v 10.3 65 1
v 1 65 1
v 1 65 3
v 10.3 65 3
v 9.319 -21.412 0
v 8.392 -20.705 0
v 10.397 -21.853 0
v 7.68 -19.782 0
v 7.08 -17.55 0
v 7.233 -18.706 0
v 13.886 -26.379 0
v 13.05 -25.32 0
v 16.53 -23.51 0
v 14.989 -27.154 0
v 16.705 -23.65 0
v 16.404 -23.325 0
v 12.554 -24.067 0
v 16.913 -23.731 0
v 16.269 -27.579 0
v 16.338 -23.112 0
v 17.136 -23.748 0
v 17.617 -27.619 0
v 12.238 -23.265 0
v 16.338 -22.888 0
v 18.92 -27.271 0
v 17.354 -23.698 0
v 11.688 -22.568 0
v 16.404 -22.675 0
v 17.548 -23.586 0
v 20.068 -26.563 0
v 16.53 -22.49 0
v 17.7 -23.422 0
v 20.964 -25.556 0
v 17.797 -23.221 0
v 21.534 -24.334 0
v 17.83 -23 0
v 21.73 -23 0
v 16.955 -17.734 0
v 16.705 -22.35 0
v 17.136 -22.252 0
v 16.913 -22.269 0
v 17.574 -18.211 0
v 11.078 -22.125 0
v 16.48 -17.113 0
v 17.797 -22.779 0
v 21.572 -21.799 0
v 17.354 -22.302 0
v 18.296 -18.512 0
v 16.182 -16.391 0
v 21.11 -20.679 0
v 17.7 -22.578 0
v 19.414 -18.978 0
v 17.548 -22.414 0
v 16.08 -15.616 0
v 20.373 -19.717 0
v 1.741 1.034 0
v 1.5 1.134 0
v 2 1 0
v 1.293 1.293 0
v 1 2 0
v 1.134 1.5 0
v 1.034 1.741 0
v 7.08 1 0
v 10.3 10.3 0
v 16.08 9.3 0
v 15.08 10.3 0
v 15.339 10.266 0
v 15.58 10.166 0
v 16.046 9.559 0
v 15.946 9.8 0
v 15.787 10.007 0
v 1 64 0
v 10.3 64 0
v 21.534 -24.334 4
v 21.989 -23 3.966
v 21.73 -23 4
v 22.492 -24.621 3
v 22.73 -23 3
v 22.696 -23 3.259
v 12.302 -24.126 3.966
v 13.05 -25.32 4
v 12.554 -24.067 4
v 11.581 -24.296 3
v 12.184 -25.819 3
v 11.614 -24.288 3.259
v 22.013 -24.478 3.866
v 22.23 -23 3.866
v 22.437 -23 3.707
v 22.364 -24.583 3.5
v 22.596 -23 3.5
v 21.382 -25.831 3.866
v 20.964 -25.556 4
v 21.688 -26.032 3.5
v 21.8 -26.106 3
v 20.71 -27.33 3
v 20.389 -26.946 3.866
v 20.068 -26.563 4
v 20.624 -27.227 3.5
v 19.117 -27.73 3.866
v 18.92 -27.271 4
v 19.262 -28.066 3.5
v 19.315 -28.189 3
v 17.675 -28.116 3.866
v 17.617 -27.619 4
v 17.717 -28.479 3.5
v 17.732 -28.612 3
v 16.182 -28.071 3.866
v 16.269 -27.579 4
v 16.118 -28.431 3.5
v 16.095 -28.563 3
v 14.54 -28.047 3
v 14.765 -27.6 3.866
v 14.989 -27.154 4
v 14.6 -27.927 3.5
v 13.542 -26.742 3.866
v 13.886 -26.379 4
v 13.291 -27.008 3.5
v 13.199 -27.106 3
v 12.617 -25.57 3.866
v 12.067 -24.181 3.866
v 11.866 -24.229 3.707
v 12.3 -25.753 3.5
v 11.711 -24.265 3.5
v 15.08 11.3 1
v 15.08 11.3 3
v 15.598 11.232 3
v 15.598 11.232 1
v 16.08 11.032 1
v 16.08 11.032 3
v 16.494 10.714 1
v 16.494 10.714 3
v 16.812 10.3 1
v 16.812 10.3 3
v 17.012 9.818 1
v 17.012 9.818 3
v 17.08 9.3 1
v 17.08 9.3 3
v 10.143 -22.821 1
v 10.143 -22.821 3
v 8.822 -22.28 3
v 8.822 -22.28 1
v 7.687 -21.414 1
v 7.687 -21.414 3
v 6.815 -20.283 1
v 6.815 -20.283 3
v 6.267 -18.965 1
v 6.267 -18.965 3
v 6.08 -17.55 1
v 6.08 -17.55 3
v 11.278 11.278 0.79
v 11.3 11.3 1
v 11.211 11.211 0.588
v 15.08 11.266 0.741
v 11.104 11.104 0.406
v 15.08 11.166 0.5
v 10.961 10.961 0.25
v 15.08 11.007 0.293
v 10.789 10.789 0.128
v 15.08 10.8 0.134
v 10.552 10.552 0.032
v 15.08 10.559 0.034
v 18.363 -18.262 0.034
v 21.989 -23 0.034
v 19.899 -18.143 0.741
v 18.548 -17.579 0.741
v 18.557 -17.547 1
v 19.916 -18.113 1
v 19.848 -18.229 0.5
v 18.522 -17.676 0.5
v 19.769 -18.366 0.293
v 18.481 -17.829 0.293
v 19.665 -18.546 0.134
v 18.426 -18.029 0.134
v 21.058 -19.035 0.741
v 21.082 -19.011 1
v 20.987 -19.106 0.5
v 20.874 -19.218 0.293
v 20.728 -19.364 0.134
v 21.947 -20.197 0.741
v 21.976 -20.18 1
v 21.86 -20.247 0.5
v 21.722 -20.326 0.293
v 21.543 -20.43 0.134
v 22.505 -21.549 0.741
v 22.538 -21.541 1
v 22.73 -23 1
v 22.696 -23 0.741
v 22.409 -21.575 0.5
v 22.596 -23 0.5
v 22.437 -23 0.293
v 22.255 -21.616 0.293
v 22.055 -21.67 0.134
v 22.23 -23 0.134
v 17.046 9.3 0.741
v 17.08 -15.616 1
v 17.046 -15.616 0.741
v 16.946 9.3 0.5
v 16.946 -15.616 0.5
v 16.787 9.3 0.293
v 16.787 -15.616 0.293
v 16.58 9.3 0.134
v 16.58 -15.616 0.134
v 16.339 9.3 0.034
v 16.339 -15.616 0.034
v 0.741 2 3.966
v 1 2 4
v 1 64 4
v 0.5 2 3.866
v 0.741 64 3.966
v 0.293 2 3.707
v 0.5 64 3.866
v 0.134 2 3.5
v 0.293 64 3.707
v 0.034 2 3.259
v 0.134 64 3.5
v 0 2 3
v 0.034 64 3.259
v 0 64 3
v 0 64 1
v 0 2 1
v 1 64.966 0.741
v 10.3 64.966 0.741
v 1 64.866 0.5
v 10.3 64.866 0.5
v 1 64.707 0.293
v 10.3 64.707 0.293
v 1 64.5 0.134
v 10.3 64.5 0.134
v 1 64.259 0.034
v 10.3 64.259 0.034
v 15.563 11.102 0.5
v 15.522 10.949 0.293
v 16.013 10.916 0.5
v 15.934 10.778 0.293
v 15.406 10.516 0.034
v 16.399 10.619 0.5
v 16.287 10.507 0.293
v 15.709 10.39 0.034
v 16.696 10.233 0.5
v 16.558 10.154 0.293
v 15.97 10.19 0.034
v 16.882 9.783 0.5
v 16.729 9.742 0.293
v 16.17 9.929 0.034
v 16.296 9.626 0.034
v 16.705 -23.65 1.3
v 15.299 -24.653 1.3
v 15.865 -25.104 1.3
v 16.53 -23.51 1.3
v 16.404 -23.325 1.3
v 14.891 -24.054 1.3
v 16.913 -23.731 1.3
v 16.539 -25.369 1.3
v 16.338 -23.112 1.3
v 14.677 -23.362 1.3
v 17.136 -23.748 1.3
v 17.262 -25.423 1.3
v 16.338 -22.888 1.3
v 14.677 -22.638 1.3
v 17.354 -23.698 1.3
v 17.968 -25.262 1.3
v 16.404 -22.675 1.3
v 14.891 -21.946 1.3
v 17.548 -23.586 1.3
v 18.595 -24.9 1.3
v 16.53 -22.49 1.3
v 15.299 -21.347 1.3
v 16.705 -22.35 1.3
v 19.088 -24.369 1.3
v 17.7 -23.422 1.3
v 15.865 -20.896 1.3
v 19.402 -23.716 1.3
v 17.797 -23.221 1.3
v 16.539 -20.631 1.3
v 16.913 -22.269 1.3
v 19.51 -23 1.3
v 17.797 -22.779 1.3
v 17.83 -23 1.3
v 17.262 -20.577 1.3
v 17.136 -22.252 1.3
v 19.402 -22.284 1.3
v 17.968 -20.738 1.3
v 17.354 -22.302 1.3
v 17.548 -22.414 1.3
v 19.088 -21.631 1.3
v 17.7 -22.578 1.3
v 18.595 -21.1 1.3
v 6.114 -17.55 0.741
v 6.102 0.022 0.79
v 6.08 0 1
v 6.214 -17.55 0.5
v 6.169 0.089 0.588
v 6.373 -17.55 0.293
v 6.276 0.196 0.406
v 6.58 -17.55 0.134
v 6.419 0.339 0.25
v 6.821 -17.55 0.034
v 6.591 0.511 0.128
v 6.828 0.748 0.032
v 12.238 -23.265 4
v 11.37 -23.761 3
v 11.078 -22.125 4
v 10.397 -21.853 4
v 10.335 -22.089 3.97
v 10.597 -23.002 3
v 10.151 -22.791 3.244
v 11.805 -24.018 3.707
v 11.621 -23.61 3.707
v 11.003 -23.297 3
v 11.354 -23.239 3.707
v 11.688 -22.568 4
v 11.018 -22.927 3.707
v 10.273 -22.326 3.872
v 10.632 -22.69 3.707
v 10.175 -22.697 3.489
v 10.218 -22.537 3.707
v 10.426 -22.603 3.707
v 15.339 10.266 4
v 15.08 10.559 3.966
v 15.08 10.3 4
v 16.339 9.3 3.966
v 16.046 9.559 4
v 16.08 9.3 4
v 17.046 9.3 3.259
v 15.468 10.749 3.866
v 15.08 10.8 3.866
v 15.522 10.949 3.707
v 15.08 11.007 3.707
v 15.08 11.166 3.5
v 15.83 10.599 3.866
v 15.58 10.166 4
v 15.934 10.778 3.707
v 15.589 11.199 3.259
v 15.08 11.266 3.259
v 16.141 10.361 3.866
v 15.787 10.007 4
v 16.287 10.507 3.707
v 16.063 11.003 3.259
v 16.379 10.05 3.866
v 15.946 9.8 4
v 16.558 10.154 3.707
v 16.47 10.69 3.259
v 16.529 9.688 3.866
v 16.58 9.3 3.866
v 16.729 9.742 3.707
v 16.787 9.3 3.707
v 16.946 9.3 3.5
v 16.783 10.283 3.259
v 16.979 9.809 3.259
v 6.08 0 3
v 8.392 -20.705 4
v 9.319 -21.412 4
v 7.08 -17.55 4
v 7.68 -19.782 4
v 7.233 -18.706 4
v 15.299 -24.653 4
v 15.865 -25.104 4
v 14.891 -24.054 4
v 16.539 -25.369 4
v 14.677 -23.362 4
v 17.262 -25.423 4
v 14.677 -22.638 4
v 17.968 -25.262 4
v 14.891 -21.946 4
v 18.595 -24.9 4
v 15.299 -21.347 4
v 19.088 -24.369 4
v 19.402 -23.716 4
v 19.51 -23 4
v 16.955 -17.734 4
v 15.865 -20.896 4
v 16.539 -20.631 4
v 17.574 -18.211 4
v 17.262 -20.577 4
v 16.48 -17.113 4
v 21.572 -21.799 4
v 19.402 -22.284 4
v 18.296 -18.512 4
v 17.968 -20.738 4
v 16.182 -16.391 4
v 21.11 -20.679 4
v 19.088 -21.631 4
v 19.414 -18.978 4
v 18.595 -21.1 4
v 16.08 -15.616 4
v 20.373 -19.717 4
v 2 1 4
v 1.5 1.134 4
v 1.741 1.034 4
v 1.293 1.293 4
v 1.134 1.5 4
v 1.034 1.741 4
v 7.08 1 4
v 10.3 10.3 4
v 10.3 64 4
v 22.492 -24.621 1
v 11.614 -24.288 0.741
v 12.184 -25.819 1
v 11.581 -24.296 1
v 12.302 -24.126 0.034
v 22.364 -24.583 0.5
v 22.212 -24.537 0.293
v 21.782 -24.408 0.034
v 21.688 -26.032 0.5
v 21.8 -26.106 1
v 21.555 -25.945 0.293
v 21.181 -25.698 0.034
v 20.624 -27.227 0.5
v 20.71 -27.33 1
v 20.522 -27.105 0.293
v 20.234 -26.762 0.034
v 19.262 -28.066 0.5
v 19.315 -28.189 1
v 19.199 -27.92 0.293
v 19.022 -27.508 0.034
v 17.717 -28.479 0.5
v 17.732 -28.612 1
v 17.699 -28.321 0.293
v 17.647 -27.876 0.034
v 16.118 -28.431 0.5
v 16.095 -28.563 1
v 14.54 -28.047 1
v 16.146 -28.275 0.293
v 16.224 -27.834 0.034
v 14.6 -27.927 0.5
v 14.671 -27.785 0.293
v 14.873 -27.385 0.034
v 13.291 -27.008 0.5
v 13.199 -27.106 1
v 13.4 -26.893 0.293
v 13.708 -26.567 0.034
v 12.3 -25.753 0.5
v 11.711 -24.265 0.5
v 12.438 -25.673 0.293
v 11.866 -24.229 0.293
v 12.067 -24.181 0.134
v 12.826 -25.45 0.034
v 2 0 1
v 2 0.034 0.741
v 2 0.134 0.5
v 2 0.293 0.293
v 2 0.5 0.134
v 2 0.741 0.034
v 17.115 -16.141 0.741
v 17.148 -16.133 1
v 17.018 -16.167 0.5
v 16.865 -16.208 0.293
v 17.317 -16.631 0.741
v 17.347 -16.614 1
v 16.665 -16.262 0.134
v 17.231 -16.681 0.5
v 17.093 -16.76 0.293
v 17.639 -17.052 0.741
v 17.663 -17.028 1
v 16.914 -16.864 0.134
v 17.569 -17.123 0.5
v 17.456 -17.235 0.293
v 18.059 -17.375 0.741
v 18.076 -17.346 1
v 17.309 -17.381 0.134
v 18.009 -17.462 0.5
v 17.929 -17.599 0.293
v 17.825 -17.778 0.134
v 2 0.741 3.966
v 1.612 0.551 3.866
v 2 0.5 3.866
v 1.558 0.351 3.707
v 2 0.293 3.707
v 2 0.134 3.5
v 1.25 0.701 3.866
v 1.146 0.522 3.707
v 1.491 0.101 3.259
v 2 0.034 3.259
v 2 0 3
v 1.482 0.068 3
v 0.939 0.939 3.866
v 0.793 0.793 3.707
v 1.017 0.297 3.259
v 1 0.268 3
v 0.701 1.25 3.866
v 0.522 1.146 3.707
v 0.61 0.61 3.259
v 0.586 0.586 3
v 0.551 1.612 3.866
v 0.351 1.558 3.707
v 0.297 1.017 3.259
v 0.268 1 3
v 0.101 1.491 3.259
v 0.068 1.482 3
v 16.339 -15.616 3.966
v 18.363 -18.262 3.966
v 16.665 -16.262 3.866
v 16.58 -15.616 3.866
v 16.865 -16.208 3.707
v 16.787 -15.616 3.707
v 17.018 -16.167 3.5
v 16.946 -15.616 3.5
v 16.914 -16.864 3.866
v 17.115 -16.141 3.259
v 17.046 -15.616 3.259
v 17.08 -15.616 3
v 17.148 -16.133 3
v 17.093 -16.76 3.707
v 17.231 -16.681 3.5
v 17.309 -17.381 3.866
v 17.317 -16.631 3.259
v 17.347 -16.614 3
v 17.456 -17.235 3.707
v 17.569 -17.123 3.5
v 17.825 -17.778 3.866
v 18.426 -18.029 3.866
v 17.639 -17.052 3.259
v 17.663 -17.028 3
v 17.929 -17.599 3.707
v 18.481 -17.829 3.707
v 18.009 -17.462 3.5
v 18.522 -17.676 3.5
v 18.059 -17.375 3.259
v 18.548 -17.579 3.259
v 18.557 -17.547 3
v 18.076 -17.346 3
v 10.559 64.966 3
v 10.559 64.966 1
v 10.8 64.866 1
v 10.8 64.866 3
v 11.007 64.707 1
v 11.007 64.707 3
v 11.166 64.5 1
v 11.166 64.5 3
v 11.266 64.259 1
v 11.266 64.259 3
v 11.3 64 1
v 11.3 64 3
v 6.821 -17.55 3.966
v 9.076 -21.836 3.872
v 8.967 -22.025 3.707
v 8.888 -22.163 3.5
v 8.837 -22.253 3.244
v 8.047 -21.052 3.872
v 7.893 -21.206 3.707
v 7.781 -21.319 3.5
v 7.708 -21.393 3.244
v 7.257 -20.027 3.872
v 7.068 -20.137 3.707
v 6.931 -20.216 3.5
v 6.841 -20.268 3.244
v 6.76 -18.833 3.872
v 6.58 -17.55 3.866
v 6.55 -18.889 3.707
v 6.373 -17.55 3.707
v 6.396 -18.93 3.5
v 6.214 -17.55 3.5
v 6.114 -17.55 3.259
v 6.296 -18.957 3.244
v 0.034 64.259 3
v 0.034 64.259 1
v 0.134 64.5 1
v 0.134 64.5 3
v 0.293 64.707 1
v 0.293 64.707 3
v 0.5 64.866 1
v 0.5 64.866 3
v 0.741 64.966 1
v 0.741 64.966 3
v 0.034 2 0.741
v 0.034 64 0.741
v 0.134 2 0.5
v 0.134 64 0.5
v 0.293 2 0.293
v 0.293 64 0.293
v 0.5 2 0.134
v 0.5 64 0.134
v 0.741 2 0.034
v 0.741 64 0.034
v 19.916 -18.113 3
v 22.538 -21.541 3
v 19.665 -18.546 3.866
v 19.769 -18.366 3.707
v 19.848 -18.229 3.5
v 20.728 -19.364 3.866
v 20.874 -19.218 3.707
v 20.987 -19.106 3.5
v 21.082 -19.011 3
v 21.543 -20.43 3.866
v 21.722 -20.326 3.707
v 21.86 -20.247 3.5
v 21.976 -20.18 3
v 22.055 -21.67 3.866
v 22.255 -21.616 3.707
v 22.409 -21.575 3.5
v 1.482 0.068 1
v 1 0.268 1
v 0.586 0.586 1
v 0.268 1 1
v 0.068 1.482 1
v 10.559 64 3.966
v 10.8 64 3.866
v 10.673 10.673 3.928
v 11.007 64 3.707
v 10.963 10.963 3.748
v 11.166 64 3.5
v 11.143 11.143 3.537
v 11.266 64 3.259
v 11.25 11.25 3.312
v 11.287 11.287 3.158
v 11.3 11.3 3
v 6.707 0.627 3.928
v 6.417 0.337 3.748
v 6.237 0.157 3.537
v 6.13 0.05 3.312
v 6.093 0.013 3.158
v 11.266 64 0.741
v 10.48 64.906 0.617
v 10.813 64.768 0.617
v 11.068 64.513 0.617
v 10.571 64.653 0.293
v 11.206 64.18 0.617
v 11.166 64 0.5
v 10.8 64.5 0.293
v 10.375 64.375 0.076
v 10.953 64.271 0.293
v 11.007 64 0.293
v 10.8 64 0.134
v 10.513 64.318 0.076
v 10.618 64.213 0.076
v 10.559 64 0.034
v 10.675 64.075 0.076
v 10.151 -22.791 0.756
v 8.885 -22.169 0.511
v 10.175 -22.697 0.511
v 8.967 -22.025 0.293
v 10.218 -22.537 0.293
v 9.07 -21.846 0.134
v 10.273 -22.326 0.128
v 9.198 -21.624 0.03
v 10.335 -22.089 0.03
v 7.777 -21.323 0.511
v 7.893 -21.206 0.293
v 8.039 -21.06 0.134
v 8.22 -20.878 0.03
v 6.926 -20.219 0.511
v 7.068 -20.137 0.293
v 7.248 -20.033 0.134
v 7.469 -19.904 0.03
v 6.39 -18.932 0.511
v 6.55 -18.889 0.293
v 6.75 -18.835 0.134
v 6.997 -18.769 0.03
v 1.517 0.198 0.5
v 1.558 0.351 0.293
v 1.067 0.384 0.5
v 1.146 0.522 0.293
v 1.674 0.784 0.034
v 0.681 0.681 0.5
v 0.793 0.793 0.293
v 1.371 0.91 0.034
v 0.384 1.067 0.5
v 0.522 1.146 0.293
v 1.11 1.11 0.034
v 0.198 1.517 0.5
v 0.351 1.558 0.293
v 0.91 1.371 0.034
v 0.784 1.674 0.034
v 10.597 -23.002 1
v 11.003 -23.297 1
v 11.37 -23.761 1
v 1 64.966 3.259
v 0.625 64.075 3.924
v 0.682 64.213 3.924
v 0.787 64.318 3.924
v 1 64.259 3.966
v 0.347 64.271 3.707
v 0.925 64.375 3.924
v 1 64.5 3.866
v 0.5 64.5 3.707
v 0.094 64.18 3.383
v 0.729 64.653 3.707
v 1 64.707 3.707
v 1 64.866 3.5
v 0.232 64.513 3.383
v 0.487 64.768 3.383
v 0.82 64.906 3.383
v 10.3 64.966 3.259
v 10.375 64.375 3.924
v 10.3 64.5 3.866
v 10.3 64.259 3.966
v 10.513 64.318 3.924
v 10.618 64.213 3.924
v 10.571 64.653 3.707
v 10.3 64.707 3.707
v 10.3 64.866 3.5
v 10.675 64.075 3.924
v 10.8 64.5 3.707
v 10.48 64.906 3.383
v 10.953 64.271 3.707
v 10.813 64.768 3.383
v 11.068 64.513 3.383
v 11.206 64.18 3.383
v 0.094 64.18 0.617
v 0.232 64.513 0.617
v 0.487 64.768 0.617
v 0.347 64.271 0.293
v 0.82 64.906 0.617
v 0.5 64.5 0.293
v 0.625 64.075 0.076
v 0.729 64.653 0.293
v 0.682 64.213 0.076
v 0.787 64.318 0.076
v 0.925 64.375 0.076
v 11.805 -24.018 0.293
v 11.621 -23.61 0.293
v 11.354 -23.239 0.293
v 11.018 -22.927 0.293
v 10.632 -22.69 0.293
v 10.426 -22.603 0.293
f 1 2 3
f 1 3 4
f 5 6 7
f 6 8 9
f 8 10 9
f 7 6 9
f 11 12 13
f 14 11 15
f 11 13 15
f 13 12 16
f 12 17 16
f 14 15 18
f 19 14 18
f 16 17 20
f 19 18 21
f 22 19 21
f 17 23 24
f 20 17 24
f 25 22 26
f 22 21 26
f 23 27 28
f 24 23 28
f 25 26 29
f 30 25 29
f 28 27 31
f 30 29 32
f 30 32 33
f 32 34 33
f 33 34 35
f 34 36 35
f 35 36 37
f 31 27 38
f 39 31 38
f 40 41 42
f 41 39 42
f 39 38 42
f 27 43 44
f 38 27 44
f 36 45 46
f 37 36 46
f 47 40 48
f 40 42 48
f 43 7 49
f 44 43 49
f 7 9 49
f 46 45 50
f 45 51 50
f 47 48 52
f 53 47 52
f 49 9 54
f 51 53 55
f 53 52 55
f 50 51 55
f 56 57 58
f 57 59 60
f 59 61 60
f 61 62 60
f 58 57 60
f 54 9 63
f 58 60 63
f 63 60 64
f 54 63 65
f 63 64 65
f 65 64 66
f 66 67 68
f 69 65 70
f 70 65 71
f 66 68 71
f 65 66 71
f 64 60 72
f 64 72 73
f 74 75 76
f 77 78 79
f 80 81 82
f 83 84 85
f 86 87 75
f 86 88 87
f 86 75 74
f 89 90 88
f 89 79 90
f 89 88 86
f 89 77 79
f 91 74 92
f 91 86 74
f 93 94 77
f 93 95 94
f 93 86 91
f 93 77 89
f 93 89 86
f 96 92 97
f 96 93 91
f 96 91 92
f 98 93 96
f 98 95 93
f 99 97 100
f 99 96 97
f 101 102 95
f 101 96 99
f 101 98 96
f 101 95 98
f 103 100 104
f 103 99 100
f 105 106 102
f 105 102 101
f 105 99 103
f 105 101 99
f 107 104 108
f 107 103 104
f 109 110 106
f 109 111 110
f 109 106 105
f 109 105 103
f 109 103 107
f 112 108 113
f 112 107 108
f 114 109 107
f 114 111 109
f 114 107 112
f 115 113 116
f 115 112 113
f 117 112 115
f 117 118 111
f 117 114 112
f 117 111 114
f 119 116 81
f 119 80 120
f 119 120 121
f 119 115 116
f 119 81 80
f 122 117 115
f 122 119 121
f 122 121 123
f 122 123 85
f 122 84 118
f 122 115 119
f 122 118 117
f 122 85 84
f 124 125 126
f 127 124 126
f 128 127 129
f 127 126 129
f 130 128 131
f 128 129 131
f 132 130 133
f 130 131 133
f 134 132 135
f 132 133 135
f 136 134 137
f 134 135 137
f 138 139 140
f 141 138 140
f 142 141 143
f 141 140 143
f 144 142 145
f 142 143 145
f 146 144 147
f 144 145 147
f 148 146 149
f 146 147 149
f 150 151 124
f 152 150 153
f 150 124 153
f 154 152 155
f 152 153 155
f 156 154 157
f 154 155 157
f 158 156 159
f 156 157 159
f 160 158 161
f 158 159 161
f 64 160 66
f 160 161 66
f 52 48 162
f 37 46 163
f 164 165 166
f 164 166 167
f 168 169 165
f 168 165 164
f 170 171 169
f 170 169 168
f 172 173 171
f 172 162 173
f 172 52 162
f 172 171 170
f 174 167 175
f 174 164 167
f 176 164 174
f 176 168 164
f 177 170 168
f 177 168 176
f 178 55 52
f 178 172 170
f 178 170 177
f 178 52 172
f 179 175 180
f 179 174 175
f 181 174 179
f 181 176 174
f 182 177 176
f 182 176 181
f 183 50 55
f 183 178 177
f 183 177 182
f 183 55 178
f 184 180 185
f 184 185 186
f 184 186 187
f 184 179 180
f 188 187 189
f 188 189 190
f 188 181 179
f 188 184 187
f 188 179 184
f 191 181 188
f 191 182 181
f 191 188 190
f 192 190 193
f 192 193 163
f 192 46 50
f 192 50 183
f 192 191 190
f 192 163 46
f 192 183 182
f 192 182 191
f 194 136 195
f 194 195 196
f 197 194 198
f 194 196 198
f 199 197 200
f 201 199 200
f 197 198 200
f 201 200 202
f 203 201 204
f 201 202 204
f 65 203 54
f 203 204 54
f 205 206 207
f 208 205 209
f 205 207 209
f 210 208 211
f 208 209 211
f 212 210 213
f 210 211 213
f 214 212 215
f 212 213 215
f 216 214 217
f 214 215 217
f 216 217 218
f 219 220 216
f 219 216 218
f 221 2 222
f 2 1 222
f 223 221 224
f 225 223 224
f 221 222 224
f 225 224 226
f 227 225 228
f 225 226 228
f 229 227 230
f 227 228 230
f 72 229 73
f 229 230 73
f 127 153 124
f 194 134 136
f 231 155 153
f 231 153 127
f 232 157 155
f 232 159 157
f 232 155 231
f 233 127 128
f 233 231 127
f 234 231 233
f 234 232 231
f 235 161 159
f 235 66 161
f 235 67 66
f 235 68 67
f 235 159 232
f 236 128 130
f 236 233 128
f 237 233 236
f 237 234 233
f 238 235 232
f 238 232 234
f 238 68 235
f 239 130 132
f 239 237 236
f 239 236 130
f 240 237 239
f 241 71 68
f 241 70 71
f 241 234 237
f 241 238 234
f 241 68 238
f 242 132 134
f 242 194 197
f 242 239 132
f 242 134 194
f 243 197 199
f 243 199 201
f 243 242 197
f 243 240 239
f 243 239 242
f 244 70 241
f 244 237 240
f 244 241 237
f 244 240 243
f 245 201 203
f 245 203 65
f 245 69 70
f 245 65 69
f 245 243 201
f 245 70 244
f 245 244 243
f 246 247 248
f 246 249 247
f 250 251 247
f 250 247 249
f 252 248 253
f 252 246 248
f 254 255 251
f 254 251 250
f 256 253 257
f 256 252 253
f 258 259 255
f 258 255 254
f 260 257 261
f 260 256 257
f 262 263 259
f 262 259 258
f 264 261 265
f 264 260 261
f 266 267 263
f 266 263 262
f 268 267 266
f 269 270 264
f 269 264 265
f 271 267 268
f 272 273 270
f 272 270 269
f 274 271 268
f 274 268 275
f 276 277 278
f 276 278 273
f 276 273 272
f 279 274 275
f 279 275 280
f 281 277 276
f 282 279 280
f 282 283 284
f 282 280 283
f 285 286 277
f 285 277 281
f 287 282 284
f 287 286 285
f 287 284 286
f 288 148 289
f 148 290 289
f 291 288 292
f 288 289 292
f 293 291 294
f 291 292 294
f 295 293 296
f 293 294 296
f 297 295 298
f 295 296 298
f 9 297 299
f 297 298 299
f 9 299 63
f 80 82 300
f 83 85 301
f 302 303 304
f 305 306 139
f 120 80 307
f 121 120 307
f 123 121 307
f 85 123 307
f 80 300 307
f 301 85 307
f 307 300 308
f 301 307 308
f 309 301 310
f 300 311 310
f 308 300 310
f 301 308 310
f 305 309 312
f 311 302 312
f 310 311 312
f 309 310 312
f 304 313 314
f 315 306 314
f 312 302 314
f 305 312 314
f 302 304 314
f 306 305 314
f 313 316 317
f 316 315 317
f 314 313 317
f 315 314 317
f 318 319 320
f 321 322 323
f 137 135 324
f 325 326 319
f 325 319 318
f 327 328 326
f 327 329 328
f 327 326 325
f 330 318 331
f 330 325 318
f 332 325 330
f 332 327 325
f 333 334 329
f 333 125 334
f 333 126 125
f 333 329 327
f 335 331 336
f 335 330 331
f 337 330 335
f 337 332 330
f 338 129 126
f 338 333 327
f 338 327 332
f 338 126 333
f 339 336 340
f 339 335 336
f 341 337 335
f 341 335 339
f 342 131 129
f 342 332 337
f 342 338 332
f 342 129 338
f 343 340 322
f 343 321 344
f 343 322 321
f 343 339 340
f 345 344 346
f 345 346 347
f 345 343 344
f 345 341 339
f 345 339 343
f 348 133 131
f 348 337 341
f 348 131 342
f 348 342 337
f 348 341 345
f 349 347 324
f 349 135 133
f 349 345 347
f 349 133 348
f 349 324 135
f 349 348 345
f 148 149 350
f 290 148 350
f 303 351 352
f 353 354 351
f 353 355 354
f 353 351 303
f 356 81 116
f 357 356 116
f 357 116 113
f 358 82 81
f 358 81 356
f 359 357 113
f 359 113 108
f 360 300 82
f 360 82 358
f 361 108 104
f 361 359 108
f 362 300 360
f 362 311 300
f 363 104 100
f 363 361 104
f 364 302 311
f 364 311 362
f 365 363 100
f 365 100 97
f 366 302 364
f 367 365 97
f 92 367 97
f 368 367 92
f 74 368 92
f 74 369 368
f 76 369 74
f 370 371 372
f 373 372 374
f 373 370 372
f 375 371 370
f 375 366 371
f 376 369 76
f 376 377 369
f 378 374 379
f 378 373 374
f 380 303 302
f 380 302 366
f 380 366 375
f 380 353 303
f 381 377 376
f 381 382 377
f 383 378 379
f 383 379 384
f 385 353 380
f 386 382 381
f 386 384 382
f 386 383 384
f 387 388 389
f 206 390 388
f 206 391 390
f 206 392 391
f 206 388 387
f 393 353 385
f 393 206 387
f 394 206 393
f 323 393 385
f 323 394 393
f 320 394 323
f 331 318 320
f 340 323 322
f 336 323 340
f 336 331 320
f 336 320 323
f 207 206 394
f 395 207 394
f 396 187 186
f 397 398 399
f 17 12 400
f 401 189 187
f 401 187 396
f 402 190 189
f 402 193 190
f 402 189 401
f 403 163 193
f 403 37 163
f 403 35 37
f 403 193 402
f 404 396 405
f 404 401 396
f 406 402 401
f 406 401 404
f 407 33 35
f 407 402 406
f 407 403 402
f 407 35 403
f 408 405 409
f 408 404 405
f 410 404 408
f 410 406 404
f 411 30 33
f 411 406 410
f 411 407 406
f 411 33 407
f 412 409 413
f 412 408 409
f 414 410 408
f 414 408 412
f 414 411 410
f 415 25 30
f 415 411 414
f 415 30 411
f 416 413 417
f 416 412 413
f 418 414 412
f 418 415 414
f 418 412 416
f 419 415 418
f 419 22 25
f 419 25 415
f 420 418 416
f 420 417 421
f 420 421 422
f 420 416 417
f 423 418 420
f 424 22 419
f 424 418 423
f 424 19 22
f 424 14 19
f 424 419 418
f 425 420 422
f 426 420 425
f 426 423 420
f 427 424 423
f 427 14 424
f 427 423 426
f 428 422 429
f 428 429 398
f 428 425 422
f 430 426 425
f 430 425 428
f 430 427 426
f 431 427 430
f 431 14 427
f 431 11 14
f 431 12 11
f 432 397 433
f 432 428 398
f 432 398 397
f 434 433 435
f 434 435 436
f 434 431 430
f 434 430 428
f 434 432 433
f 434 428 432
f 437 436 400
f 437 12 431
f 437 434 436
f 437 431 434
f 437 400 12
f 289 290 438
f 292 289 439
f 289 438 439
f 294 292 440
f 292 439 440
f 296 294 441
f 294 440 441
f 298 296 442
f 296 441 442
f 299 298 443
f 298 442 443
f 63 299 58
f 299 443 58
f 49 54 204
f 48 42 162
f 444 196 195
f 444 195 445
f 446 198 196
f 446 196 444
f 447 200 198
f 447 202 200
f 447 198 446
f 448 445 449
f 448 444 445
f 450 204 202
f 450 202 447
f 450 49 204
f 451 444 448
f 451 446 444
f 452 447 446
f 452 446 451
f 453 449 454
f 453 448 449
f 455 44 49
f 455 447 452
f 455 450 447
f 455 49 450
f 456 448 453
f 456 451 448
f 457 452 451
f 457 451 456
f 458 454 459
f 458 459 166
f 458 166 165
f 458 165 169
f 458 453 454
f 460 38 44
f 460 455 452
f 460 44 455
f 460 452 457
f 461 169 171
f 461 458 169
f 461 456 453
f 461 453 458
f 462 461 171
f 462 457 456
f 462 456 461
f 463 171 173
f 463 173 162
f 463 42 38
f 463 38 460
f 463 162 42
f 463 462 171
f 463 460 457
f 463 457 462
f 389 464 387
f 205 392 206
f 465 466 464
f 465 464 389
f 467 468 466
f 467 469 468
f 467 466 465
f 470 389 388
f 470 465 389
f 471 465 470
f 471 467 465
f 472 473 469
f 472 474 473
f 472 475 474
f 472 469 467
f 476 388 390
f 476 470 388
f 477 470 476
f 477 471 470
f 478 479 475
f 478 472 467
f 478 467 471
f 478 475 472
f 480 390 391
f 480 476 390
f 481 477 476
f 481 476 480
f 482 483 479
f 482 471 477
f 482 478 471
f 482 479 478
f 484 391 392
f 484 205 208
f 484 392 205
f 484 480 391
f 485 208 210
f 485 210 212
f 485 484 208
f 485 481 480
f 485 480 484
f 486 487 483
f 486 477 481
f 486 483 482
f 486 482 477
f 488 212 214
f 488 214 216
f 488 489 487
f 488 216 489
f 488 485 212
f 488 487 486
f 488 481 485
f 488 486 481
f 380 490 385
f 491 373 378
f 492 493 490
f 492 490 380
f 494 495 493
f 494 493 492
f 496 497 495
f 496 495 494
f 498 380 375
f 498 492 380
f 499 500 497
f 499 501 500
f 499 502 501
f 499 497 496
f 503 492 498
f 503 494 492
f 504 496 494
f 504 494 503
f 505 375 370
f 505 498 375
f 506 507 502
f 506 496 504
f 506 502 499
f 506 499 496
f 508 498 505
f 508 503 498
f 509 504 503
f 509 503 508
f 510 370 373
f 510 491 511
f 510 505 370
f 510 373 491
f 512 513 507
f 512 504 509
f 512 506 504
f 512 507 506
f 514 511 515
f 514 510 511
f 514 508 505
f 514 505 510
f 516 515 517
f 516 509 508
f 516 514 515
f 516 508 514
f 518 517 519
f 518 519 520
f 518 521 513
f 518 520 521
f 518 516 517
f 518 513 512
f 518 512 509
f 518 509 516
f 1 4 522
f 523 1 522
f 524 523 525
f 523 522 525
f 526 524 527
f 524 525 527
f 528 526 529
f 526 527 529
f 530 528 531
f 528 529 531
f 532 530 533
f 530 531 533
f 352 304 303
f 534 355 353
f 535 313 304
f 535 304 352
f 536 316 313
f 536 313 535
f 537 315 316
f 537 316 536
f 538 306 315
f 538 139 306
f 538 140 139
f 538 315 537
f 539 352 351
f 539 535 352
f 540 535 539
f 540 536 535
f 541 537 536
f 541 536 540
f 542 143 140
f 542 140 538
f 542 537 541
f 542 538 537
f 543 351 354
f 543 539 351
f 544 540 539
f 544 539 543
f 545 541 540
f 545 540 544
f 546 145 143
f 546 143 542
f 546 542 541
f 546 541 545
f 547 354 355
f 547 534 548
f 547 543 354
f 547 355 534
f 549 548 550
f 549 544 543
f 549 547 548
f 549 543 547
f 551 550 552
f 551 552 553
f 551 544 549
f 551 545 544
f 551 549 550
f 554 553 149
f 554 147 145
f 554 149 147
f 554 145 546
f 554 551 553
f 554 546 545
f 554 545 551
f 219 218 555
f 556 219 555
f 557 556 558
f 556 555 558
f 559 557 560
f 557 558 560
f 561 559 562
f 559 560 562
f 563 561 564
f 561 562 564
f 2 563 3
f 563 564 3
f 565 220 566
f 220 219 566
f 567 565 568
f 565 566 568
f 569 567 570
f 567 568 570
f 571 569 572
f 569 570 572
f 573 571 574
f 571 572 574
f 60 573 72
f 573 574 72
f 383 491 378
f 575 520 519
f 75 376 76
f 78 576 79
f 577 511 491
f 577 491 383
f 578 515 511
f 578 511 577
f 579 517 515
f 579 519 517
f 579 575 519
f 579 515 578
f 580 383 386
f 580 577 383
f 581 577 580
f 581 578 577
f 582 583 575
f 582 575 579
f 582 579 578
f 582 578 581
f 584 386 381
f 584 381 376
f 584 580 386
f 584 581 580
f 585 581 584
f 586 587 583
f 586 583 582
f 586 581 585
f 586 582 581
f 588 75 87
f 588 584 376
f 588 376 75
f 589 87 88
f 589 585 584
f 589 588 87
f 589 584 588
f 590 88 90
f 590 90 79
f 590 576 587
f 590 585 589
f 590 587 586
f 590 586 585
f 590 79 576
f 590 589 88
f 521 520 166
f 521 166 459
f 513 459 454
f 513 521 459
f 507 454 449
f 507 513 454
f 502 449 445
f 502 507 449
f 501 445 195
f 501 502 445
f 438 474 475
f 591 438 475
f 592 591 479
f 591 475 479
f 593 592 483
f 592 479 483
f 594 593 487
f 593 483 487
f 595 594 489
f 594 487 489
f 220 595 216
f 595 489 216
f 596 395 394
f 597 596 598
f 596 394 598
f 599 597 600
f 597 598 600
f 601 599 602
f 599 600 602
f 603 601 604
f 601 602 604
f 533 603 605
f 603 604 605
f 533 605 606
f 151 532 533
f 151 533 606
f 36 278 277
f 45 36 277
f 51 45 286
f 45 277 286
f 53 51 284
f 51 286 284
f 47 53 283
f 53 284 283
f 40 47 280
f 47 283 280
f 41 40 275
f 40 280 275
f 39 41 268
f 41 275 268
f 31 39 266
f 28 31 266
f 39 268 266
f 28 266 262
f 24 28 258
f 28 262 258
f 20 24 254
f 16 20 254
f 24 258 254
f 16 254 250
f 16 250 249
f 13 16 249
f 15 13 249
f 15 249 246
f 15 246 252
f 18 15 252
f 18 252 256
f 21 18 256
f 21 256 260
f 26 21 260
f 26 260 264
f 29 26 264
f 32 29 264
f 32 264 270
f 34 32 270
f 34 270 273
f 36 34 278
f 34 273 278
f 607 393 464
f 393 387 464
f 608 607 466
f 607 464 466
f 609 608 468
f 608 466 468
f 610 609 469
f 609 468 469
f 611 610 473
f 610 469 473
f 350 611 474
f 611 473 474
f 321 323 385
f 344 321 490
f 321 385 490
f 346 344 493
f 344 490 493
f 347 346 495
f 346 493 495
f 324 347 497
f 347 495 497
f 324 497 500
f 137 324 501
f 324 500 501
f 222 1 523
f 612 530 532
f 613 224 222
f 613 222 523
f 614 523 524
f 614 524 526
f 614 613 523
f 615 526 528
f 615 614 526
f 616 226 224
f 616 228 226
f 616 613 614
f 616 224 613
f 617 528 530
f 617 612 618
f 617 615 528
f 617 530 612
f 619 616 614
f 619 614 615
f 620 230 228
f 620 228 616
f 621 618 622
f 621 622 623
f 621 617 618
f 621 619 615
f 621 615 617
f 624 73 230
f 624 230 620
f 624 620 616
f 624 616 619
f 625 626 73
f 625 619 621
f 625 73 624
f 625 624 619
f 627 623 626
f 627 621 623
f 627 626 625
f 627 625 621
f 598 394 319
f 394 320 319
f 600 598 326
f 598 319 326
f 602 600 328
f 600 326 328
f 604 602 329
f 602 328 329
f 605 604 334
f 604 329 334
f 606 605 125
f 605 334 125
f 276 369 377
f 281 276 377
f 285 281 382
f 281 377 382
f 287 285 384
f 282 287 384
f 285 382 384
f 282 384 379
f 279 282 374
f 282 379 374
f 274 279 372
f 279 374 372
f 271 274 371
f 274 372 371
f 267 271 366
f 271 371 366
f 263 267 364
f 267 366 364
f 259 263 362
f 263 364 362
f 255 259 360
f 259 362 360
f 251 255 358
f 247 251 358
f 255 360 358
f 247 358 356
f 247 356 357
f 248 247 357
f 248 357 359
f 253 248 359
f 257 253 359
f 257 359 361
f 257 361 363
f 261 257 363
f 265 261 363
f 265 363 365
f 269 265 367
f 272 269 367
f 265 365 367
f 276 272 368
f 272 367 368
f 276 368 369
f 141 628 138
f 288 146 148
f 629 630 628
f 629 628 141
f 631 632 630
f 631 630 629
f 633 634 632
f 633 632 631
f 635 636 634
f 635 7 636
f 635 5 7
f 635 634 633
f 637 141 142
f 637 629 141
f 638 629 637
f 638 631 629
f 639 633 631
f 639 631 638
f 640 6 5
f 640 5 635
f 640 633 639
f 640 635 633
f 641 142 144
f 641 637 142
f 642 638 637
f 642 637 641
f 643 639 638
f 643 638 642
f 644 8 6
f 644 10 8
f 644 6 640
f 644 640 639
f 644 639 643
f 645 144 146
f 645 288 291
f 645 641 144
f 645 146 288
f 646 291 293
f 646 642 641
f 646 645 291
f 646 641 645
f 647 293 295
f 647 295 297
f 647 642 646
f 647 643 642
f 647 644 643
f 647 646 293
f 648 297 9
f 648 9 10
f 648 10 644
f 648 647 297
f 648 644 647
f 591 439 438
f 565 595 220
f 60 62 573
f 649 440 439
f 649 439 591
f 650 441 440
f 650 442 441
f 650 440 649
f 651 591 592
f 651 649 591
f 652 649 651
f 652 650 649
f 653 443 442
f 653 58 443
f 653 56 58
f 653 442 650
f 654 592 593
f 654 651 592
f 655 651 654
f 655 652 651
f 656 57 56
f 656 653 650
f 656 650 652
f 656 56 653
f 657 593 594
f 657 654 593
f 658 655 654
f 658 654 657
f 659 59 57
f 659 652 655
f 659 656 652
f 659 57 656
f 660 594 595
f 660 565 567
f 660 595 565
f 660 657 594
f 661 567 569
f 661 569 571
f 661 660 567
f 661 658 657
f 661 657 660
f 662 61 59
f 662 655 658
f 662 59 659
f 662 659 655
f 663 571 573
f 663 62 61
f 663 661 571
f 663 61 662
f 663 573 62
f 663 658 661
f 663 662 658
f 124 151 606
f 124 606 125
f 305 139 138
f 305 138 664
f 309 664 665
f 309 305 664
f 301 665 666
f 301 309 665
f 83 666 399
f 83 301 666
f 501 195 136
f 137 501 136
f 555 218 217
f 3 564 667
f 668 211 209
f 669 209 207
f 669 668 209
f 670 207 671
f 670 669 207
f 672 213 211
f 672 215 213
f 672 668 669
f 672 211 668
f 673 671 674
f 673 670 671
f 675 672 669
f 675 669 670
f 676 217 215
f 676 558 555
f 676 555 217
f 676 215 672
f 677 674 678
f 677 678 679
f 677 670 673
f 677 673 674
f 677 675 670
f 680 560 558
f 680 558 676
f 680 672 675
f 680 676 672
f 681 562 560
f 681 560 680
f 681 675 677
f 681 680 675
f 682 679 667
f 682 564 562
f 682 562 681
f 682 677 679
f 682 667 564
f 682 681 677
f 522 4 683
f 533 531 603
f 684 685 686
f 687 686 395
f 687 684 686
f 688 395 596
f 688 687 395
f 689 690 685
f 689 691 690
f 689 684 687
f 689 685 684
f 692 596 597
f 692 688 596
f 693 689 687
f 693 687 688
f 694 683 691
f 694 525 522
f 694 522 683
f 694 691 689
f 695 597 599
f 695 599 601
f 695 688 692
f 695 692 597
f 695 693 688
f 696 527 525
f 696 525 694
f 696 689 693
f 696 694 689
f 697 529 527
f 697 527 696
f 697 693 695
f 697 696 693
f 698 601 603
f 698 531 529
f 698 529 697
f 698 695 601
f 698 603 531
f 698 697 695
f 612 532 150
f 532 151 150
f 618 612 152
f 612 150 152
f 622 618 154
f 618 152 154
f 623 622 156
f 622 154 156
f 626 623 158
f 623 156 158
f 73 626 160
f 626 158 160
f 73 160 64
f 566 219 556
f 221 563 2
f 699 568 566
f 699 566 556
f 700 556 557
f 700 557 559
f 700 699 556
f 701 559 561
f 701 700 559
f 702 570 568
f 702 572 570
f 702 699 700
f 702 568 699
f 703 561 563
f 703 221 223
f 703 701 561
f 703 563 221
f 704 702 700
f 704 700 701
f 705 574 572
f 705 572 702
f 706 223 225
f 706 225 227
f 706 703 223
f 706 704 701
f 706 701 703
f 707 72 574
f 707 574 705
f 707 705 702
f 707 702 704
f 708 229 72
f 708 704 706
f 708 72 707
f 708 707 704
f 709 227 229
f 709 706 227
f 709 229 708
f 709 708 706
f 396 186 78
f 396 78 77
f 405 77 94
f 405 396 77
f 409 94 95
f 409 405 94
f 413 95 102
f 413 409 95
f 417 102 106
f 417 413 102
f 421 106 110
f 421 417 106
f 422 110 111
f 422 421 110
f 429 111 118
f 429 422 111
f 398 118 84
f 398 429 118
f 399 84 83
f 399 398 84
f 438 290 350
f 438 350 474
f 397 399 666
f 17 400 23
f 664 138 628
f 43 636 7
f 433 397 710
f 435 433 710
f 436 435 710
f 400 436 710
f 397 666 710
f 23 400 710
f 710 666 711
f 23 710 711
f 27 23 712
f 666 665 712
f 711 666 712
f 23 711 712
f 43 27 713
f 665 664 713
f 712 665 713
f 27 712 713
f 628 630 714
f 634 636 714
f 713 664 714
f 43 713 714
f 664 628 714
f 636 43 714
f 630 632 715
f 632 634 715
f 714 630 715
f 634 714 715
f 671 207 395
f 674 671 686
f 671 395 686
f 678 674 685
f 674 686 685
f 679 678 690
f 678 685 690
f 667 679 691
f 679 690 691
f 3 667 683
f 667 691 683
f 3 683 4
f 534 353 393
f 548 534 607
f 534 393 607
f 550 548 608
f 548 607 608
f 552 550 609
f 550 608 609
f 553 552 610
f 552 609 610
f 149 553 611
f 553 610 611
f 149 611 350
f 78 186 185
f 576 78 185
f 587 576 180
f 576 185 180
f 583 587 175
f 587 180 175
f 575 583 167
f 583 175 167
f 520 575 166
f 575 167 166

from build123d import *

# Parameters (mm, degrees)
BOSS_EXTRU_1_DEPTH      = 4
ESQUISSE4_R             = 2.43
ENL_V_MAT_EXTRU_1_DEPTH = 2.7
ESQUISSE5_R             = 0.75
ENL_V_MAT_EXTRU_2_DEPTH = 1.3
CONG_1_R                = 1
ESQUISSE6_W             = 5.35
ESQUISSE6_H             = 23
BOSS_EXTRU_2_DEPTH      = 4
CONG_4_R                = 5.45
ENL_V_START             = -4
ENL_V_MAT_EXTRU_3_DEPTH = 4
CONG_5_R                = 2
CONG_6_R                = 2
CONG_7_R                = 1


with BuildPart() as part:
    # Esquisse3 → Boss.-Extru.1 (new body)
    with BuildSketch(Plane.XY):
        with BuildLine():
            Line((0, 0), (0, 65))
            Line((0, 65), (11.3, 65))
            Line((11.3, 65), (11.3, 11.3))
            Line((11.3, 11.3), (22.73, 11.3))
            Line((22.73, 11.3), (22.73, -23))
            ThreePointArc((22.73, -23), (17.08, -28.65), (11.43, -23))
            Line((11.43, -23), (11.43, 0))
            Line((11.43, 0), (0, 0))
        make_face()
    extrude(amount=BOSS_EXTRU_1_DEPTH)

    # Esquisse4 → Enlèv. mat.-Extru.1 (cut)
    with BuildSketch(Plane.XY.offset(4)):
        with Locations((17.08, -23)):
            Circle(ESQUISSE4_R)
    extrude(amount=-ENL_V_MAT_EXTRU_1_DEPTH, mode=Mode.SUBTRACT)

    # Esquisse5 → Enlèv. mat.-Extru.2 (cut)
    with BuildSketch(Plane.XY.offset(1.3)):
        with Locations((17.08, -23)):
            Circle(ESQUISSE5_R)
    extrude(amount=-ENL_V_MAT_EXTRU_2_DEPTH, mode=Mode.SUBTRACT)

    # Congé1
    cong_1_edges = [part.edges().sort_by_distance(p)[0] for p in [
        (0, 65, 2),
        (11.3, 65, 2),
    ]]
    fillet(cong_1_edges, radius=CONG_1_R)

    # Esquisse6 → Boss.-Extru.2 (add)
    with BuildSketch(Plane.XY.offset(4)):
        with Locations((8.755, -11.5)):
            Rectangle(ESQUISSE6_W, ESQUISSE6_H)
    extrude(amount=-BOSS_EXTRU_2_DEPTH)

    # Congé4
    # the kernel refuses this fillet: 5.45 mm, written as the material it takes off along each edge
    with BuildSketch(Plane(origin=(6.08, -23, 17.625), x_dir=(0, 1, 0), z_dir=(0, 0, -1))) as cong_4_piece_1_section:
        with BuildLine():
            CenterArc((CONG_4_R, CONG_4_R), CONG_4_R, 180, 90)
            Line((0, CONG_4_R), (0, 0))
            Line((0, 0), (CONG_4_R, 0))
        make_face()
    cong_4_piece_1 = extrude(amount=31.25, mode=Mode.PRIVATE)
    cong_4_piece_1 = cong_4_piece_1 - Plane(origin=(17.08, -23, 2), x_dir=(1, 0, 0), z_dir=(0, 0, -1)) * Cylinder(5.65, 85, mode=Mode.PRIVATE)
    add(cong_4_piece_1, mode=Mode.SUBTRACT)

    # Esquisse7 → Enlèv. mat.-Extru.3 (cut)
    with BuildSketch(Plane.XY.offset(4).offset(ENL_V_START)):
        with BuildLine():
            Line((17.08, -17.35), (17.08, 11.3))
            Line((17.08, 11.3), (22.73, 11.3))
            Line((22.73, 11.3), (22.73, -23))
            ThreePointArc((22.73, -23), (21.075153314, -19.004846686), (17.08, -17.35))
        make_face()
    extrude(amount=ENL_V_MAT_EXTRU_3_DEPTH, mode=Mode.SUBTRACT)

    # Congé5
    cong_5_edges = [part.edges().sort_by_distance(p)[0] for p in [
        (0, 0, 2),
        (17.08, 11.3, 2),
    ]]
    fillet(cong_5_edges, radius=CONG_5_R)

    # Congé6
    cong_6_edges = [part.edges().sort_by_distance(p)[0] for p in [
        (11.430000074, -22.999082493, 2),
        (17.08, -17.35, 2),
    ]]
    fillet(cong_6_edges, radius=CONG_6_R)

    # Congé7
    cong_7_edges = [part.edges().sort_by_distance(p)[0] for p in [
        (11.3, 37.65, 4),
        (0, 33, 0),
        (0, 33, 4),
        (5.65, 65, 0),
        (11.007106781, 64.707106781, 0),
        (0.292893219, 64.707106781, 0),
        (5.65, 65, 4),
        (11.007106781, 64.707106781, 4),
        (0.292893219, 64.707106781, 4),
        (6.08, -8.775, 0),
        (6.08, -8.775, 4),
        (7.213643754, -20.877396694, 4),
        (17.08, -3.158032367, 4),
        (17.08, -3.158032367, 0),
        (13.19, 11.3, 4),
        (4.04, 0, 4),
        (0.585786438, 0.585786438, 4),
        (16.494213562, 10.714213562, 4),
        (13.19, 11.3, 0),
        (4.04, 0, 0),
        (0.585786438, 0.585786438, 0),
        (16.494213562, 10.714213562, 0),
        (21.008529301, -27.060684367, 0),
        (11.3, 37.65, 0),
        (21.008529301, -27.060684367, 4),
        (7.213643754, -20.877396694, 0),
        (11.066365829, -23.35890716, 0),
        (11.066365829, -23.35890716, 4),
        (17.491643674, -16.831434713, 4),
        (17.491643674, -16.831434713, 0),
    ]]
    fillet(cong_7_edges, radius=CONG_7_R)


solid = part.part
